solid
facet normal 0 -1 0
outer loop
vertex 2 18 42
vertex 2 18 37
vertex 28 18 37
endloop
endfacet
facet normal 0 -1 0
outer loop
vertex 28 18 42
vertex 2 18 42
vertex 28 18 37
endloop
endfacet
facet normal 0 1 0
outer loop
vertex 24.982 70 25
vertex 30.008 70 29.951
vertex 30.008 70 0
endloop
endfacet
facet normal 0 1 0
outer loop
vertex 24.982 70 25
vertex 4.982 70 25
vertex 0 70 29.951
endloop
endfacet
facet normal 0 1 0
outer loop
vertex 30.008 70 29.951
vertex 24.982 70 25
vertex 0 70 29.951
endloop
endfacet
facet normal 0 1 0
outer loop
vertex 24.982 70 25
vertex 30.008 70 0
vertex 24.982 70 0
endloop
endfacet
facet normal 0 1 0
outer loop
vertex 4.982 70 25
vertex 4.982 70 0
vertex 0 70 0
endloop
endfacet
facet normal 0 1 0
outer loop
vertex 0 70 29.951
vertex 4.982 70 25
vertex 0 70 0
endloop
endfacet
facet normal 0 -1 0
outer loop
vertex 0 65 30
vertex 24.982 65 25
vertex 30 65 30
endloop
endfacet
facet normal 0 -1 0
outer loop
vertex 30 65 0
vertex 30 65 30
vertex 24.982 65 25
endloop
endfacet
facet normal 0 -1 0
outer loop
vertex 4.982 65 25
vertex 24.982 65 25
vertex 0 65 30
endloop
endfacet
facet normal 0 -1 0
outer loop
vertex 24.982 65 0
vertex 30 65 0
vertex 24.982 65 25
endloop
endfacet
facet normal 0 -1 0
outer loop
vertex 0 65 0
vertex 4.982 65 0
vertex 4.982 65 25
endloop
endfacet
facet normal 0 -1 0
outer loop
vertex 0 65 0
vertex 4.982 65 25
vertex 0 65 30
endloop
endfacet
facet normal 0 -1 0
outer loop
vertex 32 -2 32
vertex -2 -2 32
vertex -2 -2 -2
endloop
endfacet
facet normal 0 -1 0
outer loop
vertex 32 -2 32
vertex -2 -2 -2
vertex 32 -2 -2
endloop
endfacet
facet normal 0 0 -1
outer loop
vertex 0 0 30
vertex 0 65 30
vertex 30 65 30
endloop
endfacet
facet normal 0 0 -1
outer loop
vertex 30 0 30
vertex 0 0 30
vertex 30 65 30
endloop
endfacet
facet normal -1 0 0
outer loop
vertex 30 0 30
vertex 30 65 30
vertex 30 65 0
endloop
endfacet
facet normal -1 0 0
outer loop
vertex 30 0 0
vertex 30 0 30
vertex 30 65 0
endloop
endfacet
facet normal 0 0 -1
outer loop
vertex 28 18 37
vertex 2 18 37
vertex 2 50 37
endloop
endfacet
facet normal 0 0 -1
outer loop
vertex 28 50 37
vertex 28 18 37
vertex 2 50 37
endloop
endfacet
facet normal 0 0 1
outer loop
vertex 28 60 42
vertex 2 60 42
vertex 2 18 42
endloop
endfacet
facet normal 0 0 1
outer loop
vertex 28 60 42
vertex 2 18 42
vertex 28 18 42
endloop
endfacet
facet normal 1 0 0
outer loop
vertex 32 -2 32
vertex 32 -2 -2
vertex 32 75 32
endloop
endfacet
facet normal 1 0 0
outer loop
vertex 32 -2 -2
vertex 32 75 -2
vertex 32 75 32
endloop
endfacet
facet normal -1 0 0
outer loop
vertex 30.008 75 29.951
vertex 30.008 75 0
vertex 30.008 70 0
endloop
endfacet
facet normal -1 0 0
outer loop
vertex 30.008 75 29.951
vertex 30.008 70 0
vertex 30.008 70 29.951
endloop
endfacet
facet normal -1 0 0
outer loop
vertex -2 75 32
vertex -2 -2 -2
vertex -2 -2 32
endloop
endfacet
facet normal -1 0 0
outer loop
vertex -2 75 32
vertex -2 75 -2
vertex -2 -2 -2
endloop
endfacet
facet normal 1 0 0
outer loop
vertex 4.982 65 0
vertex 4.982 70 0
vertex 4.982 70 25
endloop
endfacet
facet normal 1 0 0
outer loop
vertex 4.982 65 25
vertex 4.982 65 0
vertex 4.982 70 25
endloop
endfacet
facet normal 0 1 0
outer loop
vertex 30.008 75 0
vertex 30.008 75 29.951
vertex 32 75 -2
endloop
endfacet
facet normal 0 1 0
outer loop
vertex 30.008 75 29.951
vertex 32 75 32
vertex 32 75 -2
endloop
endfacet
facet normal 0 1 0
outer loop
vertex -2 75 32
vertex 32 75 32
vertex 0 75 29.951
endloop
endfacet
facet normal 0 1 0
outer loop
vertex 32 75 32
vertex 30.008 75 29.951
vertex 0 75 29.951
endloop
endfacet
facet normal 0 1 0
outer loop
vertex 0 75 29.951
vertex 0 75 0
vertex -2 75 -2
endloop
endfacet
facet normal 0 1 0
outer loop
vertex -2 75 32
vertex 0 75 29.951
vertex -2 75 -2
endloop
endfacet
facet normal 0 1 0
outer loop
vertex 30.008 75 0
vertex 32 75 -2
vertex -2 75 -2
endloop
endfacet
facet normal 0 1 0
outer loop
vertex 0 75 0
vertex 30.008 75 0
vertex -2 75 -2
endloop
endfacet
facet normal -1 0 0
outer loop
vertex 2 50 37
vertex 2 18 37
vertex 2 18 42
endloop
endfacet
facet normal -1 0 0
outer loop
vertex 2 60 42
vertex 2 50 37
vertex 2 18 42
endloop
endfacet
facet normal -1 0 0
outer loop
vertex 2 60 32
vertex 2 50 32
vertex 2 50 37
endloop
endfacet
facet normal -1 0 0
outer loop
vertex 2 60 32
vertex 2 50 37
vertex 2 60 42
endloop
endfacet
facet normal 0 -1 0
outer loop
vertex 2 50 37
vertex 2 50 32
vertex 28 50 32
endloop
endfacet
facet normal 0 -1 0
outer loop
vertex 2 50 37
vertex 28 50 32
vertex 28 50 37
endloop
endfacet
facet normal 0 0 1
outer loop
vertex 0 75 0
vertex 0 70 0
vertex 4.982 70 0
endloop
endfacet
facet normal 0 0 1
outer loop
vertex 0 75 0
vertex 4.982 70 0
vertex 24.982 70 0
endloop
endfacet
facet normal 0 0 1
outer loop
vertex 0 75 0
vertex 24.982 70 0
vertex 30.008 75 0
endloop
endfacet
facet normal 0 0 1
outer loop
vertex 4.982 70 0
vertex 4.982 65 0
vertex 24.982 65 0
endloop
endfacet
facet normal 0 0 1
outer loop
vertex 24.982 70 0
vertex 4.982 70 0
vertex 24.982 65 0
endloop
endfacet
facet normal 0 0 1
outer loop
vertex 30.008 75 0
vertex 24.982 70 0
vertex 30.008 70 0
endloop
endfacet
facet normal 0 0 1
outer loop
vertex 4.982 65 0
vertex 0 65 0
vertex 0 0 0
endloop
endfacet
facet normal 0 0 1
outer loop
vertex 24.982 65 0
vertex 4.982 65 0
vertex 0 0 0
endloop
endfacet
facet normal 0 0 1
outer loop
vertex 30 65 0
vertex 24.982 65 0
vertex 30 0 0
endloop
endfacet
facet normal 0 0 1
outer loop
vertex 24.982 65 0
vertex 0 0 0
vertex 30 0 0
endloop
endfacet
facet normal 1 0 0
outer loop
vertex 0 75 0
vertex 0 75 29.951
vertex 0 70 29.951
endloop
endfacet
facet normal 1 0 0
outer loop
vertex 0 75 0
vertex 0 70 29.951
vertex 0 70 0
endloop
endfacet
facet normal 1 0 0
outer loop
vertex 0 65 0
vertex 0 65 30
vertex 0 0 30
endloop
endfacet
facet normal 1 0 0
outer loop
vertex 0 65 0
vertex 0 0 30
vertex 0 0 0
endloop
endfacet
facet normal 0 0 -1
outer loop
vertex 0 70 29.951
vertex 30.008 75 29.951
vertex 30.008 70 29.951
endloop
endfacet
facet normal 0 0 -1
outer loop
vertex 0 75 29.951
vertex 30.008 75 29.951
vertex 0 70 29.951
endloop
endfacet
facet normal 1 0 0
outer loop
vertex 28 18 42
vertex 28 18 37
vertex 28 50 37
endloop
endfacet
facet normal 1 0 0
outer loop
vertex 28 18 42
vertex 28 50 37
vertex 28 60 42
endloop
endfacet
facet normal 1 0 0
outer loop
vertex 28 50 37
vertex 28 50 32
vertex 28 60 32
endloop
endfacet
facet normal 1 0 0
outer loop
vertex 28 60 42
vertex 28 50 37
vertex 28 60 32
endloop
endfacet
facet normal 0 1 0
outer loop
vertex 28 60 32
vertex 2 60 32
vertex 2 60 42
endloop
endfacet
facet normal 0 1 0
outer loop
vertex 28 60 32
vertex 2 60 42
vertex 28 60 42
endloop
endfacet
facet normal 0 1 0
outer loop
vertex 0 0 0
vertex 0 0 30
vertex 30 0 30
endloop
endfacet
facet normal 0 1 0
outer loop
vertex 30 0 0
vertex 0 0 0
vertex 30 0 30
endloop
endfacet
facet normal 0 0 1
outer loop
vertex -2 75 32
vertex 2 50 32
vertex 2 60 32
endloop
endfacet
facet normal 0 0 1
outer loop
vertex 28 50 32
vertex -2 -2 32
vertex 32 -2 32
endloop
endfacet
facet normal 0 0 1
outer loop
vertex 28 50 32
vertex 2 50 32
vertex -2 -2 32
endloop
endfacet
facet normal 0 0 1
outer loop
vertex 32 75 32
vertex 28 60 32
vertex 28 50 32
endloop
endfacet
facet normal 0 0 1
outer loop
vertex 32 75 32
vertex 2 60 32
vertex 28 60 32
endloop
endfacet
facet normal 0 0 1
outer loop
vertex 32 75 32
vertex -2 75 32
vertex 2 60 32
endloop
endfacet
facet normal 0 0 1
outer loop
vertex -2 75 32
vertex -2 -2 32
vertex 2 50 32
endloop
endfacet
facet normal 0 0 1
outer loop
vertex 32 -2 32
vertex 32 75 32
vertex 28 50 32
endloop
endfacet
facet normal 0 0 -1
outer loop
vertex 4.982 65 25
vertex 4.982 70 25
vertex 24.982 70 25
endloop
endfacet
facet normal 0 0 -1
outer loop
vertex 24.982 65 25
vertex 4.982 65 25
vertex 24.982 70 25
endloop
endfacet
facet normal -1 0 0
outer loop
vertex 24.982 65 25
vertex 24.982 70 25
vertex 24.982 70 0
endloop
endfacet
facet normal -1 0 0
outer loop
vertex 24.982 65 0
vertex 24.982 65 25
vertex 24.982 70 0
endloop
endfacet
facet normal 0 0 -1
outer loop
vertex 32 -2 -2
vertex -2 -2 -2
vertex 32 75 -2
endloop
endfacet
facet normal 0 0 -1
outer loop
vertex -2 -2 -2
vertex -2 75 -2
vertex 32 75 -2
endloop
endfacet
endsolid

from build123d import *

# Parameters (mm, degrees)
SKETCH1_W           = 34
SKETCH1_H           = 34
SKETCH1_W_2         = 30
SKETCH1_H_2         = 30
BOSS_EXTRUDE1_DEPTH = 75
BOSS_EXTRUDE2_DEPTH = 10
CUT_EXTRUDE1_DEPTH  = 5
SKETCH7_W           = 34
SKETCH7_H           = 34
BOSS_EXTRUDE3_DEPTH = 2
SKETCH8_W           = 26
SKETCH8_H           = 42
BOSS_EXTRUDE4_DEPTH = 10
SKETCH9_W           = 5
SKETCH9_H           = 32.017862038
CUT_EXTRUDE2_DEPTH  = 28


with BuildPart() as part:
    # Sketch1 → Boss-Extrude1 (new body)
    with BuildSketch(Plane(origin=(0, 0, 0), x_dir=(1, 0, 0), z_dir=(0, 1, 0))):
        with Locations((15, -15)):
            Rectangle(SKETCH1_W, SKETCH1_H)
        with Locations((15, -15)):
            Rectangle(SKETCH1_W_2, SKETCH1_H_2, mode=Mode.SUBTRACT)
    extrude(amount=BOSS_EXTRUDE1_DEPTH)

    # Sketch3 → Boss-Extrude2 (add)
    with BuildSketch(Plane(origin=(0, 75, 0), x_dir=(1, 0, 0), z_dir=(0, 1, 0))):
        Polygon((0, 0), (4.981706014, 0), (4.981706014, -25), (24.981706014, -25), (24.981706014, 0), (30, 0), (30, -30), (0, -30), align=None)
    extrude(amount=-BOSS_EXTRUDE2_DEPTH)

    # Sketch4 → Cut-Extrude1 (cut)
    with BuildSketch(Plane(origin=(0, 75, 0), x_dir=(1, 0, 0), z_dir=(0, 1, 0))):
        Polygon((24.981706014, 0), (30.007946467, 0), (30.007946467, -29.950959986), (0, -29.950959986), (0, 0), (4.981706014, 0), (4.981706014, -25), (24.981706014, -25), align=None)
    extrude(amount=-CUT_EXTRUDE1_DEPTH, mode=Mode.SUBTRACT)

    # Sketch7 → Boss-Extrude3 (add)
    with BuildSketch(Plane.XZ):
        with Locations((15, 15)):
            Rectangle(SKETCH7_W, SKETCH7_H)
    extrude(amount=BOSS_EXTRUDE3_DEPTH)

    # Sketch8 → Boss-Extrude4 (add)
    with BuildSketch(Plane.XY.offset(32)):
        with Locations((15, 39)):
            Rectangle(SKETCH8_W, SKETCH8_H)
    extrude(amount=BOSS_EXTRUDE4_DEPTH)

    # Sketch9 → Cut-Extrude2 (cut)
    with BuildSketch(Plane.ZY.offset(-2)):
        with Locations((34.5, 33.991068981)):
            Rectangle(SKETCH9_W, SKETCH9_H)
    extrude(amount=-CUT_EXTRUDE2_DEPTH, mode=Mode.SUBTRACT)


solid = part.part
